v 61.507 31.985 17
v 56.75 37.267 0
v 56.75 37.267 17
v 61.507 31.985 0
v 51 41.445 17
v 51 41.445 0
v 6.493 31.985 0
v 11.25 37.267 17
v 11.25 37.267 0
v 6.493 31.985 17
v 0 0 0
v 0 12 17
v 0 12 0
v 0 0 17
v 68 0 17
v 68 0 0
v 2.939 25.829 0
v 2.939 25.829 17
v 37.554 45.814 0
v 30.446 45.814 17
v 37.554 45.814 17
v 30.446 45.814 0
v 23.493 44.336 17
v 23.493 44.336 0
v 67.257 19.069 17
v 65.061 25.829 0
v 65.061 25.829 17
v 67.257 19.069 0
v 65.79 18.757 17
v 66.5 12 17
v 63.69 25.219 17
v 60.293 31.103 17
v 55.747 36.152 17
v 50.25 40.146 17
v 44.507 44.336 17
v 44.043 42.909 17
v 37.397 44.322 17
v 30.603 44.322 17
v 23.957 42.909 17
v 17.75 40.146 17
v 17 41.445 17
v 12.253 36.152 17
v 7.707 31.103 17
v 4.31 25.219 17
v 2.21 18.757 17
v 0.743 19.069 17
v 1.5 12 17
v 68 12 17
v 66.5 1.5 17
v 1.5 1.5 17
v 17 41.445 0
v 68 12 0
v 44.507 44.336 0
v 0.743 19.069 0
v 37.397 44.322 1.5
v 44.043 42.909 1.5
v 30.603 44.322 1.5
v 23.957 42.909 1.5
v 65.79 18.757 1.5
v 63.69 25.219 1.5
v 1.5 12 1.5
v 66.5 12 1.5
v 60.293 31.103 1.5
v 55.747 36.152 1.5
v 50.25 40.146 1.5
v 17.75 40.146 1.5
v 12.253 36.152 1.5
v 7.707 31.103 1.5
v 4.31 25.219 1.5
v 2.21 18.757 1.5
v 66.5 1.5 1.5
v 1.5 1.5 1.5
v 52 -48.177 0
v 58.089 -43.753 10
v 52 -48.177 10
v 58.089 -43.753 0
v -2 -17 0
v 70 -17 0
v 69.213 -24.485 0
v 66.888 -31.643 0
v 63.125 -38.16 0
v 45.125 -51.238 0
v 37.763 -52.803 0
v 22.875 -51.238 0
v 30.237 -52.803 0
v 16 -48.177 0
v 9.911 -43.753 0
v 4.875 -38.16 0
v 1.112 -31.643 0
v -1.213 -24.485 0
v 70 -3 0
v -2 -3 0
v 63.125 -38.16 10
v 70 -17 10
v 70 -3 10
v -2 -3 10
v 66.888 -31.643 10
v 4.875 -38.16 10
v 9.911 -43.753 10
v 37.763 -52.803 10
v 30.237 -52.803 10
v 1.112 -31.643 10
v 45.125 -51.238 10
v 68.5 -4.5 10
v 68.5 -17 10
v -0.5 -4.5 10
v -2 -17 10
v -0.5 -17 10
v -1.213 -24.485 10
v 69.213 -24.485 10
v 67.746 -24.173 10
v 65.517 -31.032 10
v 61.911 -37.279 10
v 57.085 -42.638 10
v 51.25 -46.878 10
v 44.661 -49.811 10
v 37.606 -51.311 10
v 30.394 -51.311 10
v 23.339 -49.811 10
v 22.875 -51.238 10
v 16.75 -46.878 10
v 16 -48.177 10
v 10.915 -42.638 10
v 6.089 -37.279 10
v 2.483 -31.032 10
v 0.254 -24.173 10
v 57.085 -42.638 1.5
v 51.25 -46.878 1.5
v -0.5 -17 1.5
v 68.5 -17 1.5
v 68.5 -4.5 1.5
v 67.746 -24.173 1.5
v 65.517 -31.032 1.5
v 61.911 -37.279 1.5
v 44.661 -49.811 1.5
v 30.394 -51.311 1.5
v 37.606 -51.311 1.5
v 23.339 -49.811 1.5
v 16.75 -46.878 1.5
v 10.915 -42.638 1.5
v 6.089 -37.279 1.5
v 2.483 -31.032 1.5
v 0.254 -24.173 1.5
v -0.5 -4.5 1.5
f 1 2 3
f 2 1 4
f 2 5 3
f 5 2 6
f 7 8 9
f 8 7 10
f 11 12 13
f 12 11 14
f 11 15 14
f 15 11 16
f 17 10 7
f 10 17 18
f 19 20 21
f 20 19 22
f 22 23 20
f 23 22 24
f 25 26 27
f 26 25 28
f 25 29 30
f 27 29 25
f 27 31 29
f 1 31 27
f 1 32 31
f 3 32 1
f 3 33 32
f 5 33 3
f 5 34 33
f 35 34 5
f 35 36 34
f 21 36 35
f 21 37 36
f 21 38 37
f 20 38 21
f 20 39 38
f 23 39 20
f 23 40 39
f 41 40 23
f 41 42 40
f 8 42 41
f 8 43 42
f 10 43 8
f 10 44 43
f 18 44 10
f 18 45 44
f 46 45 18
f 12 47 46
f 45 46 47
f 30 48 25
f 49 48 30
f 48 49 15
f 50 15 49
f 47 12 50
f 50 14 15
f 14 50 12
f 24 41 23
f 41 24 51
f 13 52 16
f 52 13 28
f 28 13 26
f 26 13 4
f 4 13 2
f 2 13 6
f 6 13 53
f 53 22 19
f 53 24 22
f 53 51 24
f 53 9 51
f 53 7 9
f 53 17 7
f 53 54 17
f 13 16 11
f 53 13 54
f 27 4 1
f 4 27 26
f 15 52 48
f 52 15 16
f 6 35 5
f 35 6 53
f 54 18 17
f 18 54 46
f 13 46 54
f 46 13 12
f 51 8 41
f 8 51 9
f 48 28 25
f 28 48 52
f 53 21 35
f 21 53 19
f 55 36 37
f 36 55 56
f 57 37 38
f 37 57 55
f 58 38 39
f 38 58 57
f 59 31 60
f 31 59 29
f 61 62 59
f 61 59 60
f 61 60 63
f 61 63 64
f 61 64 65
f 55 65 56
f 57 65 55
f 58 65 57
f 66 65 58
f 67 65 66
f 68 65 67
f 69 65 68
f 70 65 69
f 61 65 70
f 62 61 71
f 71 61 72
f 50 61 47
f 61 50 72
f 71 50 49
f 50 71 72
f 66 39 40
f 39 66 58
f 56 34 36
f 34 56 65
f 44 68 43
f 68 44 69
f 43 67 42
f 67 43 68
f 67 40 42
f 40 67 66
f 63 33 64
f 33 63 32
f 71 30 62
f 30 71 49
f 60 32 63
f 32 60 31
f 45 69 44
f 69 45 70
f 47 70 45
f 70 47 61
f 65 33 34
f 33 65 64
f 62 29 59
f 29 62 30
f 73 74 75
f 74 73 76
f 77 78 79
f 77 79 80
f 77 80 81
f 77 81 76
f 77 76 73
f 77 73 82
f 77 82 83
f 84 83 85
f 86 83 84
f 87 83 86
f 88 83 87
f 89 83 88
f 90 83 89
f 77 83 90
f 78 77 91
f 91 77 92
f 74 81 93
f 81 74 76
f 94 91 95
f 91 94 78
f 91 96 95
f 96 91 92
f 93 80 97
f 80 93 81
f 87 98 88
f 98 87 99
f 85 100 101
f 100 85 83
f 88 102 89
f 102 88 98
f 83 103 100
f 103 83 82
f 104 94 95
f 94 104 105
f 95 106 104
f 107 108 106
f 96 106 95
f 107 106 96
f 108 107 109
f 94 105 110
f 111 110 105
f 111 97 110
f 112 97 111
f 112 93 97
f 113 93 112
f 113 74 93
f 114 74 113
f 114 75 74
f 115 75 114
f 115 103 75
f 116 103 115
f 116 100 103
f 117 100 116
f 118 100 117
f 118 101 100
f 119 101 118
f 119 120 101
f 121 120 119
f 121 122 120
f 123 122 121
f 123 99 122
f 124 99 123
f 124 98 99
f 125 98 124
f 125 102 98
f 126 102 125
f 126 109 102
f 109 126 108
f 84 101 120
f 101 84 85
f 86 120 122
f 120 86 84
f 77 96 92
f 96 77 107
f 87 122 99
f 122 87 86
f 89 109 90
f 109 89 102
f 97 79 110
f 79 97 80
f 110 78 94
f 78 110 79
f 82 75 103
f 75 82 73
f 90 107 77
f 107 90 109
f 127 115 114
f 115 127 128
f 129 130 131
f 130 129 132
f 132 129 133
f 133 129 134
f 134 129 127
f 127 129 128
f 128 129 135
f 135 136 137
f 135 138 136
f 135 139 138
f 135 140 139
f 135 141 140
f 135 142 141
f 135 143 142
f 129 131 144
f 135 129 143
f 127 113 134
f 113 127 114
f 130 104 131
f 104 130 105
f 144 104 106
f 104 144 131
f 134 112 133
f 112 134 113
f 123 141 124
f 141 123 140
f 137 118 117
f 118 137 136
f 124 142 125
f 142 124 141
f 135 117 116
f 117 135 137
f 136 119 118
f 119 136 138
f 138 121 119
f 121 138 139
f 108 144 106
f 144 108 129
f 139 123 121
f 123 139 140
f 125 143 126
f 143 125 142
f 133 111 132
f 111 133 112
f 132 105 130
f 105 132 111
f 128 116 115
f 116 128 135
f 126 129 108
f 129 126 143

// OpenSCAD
// paramaters
box_width = 68;
box_length = 46;
base_height = 17;

lid_height = 10;

wall_thickness = 1.5; // 1, 2 or 3x  your extrusion width is a good idea
slop = 0.5;

spacing_between_parts = 3;

// [Hidden]
// formulas
lid_extra_dimen = (wall_thickness + slop) * 2;
lid_width = box_width + lid_extra_dimen;
lid_length = box_length + lid_extra_dimen;



print();

/////////////////////////////////////////////////////////////////////////////
//										//
//				Models					//
//										//
/////////////////////////////////////////////////////////////////////////////

module print() {
	box(box_width, box_length, base_height);
	translate([box_width + wall_thickness + slop, -spacing_between_parts, 0]) {
		rotate([0, 0, 180]) {
			box(lid_width, lid_length, lid_height);
		}
	}
}

module closed() {
	box(box_width, box_length, base_height);
	translate([box_width + wall_thickness + slop, -(wall_thickness + slop), base_height + wall_thickness]) {
		rotate([0, 180, 0]) {
			box(lid_width, lid_length, lid_height);
		}
	}
}

module nested() {
	translate([0, 0, wall_thickness]) {
		box(box_width, box_length, base_height);
	}
	translate([-(wall_thickness + slop), -(wall_thickness + slop), 0]) {
		box(lid_width, lid_length, lid_height);
	}
}

/////////////////////////////////////////////////////////////////////////////
//										//
//				Parts						//
//										//
/////////////////////////////////////////////////////////////////////////////

module box(width, length, height) {
	difference() {
		linear_extrude(height = height) {
			boxProfile(width, length);
		}
		translate([wall_thickness, wall_thickness, wall_thickness]) {
			linear_extrude(height = height) {
				boxProfile(width - wall_thickness * 2, length - wall_thickness * 2);
			}
		}
	}
}

module boxProfile(width, length) {
	square([width, length - width / 2]);
	intersection() {
		square([width, length]);
		translate([width / 2, length - width / 2, 0]) {
			circle(width/2);
		}
	}
}
